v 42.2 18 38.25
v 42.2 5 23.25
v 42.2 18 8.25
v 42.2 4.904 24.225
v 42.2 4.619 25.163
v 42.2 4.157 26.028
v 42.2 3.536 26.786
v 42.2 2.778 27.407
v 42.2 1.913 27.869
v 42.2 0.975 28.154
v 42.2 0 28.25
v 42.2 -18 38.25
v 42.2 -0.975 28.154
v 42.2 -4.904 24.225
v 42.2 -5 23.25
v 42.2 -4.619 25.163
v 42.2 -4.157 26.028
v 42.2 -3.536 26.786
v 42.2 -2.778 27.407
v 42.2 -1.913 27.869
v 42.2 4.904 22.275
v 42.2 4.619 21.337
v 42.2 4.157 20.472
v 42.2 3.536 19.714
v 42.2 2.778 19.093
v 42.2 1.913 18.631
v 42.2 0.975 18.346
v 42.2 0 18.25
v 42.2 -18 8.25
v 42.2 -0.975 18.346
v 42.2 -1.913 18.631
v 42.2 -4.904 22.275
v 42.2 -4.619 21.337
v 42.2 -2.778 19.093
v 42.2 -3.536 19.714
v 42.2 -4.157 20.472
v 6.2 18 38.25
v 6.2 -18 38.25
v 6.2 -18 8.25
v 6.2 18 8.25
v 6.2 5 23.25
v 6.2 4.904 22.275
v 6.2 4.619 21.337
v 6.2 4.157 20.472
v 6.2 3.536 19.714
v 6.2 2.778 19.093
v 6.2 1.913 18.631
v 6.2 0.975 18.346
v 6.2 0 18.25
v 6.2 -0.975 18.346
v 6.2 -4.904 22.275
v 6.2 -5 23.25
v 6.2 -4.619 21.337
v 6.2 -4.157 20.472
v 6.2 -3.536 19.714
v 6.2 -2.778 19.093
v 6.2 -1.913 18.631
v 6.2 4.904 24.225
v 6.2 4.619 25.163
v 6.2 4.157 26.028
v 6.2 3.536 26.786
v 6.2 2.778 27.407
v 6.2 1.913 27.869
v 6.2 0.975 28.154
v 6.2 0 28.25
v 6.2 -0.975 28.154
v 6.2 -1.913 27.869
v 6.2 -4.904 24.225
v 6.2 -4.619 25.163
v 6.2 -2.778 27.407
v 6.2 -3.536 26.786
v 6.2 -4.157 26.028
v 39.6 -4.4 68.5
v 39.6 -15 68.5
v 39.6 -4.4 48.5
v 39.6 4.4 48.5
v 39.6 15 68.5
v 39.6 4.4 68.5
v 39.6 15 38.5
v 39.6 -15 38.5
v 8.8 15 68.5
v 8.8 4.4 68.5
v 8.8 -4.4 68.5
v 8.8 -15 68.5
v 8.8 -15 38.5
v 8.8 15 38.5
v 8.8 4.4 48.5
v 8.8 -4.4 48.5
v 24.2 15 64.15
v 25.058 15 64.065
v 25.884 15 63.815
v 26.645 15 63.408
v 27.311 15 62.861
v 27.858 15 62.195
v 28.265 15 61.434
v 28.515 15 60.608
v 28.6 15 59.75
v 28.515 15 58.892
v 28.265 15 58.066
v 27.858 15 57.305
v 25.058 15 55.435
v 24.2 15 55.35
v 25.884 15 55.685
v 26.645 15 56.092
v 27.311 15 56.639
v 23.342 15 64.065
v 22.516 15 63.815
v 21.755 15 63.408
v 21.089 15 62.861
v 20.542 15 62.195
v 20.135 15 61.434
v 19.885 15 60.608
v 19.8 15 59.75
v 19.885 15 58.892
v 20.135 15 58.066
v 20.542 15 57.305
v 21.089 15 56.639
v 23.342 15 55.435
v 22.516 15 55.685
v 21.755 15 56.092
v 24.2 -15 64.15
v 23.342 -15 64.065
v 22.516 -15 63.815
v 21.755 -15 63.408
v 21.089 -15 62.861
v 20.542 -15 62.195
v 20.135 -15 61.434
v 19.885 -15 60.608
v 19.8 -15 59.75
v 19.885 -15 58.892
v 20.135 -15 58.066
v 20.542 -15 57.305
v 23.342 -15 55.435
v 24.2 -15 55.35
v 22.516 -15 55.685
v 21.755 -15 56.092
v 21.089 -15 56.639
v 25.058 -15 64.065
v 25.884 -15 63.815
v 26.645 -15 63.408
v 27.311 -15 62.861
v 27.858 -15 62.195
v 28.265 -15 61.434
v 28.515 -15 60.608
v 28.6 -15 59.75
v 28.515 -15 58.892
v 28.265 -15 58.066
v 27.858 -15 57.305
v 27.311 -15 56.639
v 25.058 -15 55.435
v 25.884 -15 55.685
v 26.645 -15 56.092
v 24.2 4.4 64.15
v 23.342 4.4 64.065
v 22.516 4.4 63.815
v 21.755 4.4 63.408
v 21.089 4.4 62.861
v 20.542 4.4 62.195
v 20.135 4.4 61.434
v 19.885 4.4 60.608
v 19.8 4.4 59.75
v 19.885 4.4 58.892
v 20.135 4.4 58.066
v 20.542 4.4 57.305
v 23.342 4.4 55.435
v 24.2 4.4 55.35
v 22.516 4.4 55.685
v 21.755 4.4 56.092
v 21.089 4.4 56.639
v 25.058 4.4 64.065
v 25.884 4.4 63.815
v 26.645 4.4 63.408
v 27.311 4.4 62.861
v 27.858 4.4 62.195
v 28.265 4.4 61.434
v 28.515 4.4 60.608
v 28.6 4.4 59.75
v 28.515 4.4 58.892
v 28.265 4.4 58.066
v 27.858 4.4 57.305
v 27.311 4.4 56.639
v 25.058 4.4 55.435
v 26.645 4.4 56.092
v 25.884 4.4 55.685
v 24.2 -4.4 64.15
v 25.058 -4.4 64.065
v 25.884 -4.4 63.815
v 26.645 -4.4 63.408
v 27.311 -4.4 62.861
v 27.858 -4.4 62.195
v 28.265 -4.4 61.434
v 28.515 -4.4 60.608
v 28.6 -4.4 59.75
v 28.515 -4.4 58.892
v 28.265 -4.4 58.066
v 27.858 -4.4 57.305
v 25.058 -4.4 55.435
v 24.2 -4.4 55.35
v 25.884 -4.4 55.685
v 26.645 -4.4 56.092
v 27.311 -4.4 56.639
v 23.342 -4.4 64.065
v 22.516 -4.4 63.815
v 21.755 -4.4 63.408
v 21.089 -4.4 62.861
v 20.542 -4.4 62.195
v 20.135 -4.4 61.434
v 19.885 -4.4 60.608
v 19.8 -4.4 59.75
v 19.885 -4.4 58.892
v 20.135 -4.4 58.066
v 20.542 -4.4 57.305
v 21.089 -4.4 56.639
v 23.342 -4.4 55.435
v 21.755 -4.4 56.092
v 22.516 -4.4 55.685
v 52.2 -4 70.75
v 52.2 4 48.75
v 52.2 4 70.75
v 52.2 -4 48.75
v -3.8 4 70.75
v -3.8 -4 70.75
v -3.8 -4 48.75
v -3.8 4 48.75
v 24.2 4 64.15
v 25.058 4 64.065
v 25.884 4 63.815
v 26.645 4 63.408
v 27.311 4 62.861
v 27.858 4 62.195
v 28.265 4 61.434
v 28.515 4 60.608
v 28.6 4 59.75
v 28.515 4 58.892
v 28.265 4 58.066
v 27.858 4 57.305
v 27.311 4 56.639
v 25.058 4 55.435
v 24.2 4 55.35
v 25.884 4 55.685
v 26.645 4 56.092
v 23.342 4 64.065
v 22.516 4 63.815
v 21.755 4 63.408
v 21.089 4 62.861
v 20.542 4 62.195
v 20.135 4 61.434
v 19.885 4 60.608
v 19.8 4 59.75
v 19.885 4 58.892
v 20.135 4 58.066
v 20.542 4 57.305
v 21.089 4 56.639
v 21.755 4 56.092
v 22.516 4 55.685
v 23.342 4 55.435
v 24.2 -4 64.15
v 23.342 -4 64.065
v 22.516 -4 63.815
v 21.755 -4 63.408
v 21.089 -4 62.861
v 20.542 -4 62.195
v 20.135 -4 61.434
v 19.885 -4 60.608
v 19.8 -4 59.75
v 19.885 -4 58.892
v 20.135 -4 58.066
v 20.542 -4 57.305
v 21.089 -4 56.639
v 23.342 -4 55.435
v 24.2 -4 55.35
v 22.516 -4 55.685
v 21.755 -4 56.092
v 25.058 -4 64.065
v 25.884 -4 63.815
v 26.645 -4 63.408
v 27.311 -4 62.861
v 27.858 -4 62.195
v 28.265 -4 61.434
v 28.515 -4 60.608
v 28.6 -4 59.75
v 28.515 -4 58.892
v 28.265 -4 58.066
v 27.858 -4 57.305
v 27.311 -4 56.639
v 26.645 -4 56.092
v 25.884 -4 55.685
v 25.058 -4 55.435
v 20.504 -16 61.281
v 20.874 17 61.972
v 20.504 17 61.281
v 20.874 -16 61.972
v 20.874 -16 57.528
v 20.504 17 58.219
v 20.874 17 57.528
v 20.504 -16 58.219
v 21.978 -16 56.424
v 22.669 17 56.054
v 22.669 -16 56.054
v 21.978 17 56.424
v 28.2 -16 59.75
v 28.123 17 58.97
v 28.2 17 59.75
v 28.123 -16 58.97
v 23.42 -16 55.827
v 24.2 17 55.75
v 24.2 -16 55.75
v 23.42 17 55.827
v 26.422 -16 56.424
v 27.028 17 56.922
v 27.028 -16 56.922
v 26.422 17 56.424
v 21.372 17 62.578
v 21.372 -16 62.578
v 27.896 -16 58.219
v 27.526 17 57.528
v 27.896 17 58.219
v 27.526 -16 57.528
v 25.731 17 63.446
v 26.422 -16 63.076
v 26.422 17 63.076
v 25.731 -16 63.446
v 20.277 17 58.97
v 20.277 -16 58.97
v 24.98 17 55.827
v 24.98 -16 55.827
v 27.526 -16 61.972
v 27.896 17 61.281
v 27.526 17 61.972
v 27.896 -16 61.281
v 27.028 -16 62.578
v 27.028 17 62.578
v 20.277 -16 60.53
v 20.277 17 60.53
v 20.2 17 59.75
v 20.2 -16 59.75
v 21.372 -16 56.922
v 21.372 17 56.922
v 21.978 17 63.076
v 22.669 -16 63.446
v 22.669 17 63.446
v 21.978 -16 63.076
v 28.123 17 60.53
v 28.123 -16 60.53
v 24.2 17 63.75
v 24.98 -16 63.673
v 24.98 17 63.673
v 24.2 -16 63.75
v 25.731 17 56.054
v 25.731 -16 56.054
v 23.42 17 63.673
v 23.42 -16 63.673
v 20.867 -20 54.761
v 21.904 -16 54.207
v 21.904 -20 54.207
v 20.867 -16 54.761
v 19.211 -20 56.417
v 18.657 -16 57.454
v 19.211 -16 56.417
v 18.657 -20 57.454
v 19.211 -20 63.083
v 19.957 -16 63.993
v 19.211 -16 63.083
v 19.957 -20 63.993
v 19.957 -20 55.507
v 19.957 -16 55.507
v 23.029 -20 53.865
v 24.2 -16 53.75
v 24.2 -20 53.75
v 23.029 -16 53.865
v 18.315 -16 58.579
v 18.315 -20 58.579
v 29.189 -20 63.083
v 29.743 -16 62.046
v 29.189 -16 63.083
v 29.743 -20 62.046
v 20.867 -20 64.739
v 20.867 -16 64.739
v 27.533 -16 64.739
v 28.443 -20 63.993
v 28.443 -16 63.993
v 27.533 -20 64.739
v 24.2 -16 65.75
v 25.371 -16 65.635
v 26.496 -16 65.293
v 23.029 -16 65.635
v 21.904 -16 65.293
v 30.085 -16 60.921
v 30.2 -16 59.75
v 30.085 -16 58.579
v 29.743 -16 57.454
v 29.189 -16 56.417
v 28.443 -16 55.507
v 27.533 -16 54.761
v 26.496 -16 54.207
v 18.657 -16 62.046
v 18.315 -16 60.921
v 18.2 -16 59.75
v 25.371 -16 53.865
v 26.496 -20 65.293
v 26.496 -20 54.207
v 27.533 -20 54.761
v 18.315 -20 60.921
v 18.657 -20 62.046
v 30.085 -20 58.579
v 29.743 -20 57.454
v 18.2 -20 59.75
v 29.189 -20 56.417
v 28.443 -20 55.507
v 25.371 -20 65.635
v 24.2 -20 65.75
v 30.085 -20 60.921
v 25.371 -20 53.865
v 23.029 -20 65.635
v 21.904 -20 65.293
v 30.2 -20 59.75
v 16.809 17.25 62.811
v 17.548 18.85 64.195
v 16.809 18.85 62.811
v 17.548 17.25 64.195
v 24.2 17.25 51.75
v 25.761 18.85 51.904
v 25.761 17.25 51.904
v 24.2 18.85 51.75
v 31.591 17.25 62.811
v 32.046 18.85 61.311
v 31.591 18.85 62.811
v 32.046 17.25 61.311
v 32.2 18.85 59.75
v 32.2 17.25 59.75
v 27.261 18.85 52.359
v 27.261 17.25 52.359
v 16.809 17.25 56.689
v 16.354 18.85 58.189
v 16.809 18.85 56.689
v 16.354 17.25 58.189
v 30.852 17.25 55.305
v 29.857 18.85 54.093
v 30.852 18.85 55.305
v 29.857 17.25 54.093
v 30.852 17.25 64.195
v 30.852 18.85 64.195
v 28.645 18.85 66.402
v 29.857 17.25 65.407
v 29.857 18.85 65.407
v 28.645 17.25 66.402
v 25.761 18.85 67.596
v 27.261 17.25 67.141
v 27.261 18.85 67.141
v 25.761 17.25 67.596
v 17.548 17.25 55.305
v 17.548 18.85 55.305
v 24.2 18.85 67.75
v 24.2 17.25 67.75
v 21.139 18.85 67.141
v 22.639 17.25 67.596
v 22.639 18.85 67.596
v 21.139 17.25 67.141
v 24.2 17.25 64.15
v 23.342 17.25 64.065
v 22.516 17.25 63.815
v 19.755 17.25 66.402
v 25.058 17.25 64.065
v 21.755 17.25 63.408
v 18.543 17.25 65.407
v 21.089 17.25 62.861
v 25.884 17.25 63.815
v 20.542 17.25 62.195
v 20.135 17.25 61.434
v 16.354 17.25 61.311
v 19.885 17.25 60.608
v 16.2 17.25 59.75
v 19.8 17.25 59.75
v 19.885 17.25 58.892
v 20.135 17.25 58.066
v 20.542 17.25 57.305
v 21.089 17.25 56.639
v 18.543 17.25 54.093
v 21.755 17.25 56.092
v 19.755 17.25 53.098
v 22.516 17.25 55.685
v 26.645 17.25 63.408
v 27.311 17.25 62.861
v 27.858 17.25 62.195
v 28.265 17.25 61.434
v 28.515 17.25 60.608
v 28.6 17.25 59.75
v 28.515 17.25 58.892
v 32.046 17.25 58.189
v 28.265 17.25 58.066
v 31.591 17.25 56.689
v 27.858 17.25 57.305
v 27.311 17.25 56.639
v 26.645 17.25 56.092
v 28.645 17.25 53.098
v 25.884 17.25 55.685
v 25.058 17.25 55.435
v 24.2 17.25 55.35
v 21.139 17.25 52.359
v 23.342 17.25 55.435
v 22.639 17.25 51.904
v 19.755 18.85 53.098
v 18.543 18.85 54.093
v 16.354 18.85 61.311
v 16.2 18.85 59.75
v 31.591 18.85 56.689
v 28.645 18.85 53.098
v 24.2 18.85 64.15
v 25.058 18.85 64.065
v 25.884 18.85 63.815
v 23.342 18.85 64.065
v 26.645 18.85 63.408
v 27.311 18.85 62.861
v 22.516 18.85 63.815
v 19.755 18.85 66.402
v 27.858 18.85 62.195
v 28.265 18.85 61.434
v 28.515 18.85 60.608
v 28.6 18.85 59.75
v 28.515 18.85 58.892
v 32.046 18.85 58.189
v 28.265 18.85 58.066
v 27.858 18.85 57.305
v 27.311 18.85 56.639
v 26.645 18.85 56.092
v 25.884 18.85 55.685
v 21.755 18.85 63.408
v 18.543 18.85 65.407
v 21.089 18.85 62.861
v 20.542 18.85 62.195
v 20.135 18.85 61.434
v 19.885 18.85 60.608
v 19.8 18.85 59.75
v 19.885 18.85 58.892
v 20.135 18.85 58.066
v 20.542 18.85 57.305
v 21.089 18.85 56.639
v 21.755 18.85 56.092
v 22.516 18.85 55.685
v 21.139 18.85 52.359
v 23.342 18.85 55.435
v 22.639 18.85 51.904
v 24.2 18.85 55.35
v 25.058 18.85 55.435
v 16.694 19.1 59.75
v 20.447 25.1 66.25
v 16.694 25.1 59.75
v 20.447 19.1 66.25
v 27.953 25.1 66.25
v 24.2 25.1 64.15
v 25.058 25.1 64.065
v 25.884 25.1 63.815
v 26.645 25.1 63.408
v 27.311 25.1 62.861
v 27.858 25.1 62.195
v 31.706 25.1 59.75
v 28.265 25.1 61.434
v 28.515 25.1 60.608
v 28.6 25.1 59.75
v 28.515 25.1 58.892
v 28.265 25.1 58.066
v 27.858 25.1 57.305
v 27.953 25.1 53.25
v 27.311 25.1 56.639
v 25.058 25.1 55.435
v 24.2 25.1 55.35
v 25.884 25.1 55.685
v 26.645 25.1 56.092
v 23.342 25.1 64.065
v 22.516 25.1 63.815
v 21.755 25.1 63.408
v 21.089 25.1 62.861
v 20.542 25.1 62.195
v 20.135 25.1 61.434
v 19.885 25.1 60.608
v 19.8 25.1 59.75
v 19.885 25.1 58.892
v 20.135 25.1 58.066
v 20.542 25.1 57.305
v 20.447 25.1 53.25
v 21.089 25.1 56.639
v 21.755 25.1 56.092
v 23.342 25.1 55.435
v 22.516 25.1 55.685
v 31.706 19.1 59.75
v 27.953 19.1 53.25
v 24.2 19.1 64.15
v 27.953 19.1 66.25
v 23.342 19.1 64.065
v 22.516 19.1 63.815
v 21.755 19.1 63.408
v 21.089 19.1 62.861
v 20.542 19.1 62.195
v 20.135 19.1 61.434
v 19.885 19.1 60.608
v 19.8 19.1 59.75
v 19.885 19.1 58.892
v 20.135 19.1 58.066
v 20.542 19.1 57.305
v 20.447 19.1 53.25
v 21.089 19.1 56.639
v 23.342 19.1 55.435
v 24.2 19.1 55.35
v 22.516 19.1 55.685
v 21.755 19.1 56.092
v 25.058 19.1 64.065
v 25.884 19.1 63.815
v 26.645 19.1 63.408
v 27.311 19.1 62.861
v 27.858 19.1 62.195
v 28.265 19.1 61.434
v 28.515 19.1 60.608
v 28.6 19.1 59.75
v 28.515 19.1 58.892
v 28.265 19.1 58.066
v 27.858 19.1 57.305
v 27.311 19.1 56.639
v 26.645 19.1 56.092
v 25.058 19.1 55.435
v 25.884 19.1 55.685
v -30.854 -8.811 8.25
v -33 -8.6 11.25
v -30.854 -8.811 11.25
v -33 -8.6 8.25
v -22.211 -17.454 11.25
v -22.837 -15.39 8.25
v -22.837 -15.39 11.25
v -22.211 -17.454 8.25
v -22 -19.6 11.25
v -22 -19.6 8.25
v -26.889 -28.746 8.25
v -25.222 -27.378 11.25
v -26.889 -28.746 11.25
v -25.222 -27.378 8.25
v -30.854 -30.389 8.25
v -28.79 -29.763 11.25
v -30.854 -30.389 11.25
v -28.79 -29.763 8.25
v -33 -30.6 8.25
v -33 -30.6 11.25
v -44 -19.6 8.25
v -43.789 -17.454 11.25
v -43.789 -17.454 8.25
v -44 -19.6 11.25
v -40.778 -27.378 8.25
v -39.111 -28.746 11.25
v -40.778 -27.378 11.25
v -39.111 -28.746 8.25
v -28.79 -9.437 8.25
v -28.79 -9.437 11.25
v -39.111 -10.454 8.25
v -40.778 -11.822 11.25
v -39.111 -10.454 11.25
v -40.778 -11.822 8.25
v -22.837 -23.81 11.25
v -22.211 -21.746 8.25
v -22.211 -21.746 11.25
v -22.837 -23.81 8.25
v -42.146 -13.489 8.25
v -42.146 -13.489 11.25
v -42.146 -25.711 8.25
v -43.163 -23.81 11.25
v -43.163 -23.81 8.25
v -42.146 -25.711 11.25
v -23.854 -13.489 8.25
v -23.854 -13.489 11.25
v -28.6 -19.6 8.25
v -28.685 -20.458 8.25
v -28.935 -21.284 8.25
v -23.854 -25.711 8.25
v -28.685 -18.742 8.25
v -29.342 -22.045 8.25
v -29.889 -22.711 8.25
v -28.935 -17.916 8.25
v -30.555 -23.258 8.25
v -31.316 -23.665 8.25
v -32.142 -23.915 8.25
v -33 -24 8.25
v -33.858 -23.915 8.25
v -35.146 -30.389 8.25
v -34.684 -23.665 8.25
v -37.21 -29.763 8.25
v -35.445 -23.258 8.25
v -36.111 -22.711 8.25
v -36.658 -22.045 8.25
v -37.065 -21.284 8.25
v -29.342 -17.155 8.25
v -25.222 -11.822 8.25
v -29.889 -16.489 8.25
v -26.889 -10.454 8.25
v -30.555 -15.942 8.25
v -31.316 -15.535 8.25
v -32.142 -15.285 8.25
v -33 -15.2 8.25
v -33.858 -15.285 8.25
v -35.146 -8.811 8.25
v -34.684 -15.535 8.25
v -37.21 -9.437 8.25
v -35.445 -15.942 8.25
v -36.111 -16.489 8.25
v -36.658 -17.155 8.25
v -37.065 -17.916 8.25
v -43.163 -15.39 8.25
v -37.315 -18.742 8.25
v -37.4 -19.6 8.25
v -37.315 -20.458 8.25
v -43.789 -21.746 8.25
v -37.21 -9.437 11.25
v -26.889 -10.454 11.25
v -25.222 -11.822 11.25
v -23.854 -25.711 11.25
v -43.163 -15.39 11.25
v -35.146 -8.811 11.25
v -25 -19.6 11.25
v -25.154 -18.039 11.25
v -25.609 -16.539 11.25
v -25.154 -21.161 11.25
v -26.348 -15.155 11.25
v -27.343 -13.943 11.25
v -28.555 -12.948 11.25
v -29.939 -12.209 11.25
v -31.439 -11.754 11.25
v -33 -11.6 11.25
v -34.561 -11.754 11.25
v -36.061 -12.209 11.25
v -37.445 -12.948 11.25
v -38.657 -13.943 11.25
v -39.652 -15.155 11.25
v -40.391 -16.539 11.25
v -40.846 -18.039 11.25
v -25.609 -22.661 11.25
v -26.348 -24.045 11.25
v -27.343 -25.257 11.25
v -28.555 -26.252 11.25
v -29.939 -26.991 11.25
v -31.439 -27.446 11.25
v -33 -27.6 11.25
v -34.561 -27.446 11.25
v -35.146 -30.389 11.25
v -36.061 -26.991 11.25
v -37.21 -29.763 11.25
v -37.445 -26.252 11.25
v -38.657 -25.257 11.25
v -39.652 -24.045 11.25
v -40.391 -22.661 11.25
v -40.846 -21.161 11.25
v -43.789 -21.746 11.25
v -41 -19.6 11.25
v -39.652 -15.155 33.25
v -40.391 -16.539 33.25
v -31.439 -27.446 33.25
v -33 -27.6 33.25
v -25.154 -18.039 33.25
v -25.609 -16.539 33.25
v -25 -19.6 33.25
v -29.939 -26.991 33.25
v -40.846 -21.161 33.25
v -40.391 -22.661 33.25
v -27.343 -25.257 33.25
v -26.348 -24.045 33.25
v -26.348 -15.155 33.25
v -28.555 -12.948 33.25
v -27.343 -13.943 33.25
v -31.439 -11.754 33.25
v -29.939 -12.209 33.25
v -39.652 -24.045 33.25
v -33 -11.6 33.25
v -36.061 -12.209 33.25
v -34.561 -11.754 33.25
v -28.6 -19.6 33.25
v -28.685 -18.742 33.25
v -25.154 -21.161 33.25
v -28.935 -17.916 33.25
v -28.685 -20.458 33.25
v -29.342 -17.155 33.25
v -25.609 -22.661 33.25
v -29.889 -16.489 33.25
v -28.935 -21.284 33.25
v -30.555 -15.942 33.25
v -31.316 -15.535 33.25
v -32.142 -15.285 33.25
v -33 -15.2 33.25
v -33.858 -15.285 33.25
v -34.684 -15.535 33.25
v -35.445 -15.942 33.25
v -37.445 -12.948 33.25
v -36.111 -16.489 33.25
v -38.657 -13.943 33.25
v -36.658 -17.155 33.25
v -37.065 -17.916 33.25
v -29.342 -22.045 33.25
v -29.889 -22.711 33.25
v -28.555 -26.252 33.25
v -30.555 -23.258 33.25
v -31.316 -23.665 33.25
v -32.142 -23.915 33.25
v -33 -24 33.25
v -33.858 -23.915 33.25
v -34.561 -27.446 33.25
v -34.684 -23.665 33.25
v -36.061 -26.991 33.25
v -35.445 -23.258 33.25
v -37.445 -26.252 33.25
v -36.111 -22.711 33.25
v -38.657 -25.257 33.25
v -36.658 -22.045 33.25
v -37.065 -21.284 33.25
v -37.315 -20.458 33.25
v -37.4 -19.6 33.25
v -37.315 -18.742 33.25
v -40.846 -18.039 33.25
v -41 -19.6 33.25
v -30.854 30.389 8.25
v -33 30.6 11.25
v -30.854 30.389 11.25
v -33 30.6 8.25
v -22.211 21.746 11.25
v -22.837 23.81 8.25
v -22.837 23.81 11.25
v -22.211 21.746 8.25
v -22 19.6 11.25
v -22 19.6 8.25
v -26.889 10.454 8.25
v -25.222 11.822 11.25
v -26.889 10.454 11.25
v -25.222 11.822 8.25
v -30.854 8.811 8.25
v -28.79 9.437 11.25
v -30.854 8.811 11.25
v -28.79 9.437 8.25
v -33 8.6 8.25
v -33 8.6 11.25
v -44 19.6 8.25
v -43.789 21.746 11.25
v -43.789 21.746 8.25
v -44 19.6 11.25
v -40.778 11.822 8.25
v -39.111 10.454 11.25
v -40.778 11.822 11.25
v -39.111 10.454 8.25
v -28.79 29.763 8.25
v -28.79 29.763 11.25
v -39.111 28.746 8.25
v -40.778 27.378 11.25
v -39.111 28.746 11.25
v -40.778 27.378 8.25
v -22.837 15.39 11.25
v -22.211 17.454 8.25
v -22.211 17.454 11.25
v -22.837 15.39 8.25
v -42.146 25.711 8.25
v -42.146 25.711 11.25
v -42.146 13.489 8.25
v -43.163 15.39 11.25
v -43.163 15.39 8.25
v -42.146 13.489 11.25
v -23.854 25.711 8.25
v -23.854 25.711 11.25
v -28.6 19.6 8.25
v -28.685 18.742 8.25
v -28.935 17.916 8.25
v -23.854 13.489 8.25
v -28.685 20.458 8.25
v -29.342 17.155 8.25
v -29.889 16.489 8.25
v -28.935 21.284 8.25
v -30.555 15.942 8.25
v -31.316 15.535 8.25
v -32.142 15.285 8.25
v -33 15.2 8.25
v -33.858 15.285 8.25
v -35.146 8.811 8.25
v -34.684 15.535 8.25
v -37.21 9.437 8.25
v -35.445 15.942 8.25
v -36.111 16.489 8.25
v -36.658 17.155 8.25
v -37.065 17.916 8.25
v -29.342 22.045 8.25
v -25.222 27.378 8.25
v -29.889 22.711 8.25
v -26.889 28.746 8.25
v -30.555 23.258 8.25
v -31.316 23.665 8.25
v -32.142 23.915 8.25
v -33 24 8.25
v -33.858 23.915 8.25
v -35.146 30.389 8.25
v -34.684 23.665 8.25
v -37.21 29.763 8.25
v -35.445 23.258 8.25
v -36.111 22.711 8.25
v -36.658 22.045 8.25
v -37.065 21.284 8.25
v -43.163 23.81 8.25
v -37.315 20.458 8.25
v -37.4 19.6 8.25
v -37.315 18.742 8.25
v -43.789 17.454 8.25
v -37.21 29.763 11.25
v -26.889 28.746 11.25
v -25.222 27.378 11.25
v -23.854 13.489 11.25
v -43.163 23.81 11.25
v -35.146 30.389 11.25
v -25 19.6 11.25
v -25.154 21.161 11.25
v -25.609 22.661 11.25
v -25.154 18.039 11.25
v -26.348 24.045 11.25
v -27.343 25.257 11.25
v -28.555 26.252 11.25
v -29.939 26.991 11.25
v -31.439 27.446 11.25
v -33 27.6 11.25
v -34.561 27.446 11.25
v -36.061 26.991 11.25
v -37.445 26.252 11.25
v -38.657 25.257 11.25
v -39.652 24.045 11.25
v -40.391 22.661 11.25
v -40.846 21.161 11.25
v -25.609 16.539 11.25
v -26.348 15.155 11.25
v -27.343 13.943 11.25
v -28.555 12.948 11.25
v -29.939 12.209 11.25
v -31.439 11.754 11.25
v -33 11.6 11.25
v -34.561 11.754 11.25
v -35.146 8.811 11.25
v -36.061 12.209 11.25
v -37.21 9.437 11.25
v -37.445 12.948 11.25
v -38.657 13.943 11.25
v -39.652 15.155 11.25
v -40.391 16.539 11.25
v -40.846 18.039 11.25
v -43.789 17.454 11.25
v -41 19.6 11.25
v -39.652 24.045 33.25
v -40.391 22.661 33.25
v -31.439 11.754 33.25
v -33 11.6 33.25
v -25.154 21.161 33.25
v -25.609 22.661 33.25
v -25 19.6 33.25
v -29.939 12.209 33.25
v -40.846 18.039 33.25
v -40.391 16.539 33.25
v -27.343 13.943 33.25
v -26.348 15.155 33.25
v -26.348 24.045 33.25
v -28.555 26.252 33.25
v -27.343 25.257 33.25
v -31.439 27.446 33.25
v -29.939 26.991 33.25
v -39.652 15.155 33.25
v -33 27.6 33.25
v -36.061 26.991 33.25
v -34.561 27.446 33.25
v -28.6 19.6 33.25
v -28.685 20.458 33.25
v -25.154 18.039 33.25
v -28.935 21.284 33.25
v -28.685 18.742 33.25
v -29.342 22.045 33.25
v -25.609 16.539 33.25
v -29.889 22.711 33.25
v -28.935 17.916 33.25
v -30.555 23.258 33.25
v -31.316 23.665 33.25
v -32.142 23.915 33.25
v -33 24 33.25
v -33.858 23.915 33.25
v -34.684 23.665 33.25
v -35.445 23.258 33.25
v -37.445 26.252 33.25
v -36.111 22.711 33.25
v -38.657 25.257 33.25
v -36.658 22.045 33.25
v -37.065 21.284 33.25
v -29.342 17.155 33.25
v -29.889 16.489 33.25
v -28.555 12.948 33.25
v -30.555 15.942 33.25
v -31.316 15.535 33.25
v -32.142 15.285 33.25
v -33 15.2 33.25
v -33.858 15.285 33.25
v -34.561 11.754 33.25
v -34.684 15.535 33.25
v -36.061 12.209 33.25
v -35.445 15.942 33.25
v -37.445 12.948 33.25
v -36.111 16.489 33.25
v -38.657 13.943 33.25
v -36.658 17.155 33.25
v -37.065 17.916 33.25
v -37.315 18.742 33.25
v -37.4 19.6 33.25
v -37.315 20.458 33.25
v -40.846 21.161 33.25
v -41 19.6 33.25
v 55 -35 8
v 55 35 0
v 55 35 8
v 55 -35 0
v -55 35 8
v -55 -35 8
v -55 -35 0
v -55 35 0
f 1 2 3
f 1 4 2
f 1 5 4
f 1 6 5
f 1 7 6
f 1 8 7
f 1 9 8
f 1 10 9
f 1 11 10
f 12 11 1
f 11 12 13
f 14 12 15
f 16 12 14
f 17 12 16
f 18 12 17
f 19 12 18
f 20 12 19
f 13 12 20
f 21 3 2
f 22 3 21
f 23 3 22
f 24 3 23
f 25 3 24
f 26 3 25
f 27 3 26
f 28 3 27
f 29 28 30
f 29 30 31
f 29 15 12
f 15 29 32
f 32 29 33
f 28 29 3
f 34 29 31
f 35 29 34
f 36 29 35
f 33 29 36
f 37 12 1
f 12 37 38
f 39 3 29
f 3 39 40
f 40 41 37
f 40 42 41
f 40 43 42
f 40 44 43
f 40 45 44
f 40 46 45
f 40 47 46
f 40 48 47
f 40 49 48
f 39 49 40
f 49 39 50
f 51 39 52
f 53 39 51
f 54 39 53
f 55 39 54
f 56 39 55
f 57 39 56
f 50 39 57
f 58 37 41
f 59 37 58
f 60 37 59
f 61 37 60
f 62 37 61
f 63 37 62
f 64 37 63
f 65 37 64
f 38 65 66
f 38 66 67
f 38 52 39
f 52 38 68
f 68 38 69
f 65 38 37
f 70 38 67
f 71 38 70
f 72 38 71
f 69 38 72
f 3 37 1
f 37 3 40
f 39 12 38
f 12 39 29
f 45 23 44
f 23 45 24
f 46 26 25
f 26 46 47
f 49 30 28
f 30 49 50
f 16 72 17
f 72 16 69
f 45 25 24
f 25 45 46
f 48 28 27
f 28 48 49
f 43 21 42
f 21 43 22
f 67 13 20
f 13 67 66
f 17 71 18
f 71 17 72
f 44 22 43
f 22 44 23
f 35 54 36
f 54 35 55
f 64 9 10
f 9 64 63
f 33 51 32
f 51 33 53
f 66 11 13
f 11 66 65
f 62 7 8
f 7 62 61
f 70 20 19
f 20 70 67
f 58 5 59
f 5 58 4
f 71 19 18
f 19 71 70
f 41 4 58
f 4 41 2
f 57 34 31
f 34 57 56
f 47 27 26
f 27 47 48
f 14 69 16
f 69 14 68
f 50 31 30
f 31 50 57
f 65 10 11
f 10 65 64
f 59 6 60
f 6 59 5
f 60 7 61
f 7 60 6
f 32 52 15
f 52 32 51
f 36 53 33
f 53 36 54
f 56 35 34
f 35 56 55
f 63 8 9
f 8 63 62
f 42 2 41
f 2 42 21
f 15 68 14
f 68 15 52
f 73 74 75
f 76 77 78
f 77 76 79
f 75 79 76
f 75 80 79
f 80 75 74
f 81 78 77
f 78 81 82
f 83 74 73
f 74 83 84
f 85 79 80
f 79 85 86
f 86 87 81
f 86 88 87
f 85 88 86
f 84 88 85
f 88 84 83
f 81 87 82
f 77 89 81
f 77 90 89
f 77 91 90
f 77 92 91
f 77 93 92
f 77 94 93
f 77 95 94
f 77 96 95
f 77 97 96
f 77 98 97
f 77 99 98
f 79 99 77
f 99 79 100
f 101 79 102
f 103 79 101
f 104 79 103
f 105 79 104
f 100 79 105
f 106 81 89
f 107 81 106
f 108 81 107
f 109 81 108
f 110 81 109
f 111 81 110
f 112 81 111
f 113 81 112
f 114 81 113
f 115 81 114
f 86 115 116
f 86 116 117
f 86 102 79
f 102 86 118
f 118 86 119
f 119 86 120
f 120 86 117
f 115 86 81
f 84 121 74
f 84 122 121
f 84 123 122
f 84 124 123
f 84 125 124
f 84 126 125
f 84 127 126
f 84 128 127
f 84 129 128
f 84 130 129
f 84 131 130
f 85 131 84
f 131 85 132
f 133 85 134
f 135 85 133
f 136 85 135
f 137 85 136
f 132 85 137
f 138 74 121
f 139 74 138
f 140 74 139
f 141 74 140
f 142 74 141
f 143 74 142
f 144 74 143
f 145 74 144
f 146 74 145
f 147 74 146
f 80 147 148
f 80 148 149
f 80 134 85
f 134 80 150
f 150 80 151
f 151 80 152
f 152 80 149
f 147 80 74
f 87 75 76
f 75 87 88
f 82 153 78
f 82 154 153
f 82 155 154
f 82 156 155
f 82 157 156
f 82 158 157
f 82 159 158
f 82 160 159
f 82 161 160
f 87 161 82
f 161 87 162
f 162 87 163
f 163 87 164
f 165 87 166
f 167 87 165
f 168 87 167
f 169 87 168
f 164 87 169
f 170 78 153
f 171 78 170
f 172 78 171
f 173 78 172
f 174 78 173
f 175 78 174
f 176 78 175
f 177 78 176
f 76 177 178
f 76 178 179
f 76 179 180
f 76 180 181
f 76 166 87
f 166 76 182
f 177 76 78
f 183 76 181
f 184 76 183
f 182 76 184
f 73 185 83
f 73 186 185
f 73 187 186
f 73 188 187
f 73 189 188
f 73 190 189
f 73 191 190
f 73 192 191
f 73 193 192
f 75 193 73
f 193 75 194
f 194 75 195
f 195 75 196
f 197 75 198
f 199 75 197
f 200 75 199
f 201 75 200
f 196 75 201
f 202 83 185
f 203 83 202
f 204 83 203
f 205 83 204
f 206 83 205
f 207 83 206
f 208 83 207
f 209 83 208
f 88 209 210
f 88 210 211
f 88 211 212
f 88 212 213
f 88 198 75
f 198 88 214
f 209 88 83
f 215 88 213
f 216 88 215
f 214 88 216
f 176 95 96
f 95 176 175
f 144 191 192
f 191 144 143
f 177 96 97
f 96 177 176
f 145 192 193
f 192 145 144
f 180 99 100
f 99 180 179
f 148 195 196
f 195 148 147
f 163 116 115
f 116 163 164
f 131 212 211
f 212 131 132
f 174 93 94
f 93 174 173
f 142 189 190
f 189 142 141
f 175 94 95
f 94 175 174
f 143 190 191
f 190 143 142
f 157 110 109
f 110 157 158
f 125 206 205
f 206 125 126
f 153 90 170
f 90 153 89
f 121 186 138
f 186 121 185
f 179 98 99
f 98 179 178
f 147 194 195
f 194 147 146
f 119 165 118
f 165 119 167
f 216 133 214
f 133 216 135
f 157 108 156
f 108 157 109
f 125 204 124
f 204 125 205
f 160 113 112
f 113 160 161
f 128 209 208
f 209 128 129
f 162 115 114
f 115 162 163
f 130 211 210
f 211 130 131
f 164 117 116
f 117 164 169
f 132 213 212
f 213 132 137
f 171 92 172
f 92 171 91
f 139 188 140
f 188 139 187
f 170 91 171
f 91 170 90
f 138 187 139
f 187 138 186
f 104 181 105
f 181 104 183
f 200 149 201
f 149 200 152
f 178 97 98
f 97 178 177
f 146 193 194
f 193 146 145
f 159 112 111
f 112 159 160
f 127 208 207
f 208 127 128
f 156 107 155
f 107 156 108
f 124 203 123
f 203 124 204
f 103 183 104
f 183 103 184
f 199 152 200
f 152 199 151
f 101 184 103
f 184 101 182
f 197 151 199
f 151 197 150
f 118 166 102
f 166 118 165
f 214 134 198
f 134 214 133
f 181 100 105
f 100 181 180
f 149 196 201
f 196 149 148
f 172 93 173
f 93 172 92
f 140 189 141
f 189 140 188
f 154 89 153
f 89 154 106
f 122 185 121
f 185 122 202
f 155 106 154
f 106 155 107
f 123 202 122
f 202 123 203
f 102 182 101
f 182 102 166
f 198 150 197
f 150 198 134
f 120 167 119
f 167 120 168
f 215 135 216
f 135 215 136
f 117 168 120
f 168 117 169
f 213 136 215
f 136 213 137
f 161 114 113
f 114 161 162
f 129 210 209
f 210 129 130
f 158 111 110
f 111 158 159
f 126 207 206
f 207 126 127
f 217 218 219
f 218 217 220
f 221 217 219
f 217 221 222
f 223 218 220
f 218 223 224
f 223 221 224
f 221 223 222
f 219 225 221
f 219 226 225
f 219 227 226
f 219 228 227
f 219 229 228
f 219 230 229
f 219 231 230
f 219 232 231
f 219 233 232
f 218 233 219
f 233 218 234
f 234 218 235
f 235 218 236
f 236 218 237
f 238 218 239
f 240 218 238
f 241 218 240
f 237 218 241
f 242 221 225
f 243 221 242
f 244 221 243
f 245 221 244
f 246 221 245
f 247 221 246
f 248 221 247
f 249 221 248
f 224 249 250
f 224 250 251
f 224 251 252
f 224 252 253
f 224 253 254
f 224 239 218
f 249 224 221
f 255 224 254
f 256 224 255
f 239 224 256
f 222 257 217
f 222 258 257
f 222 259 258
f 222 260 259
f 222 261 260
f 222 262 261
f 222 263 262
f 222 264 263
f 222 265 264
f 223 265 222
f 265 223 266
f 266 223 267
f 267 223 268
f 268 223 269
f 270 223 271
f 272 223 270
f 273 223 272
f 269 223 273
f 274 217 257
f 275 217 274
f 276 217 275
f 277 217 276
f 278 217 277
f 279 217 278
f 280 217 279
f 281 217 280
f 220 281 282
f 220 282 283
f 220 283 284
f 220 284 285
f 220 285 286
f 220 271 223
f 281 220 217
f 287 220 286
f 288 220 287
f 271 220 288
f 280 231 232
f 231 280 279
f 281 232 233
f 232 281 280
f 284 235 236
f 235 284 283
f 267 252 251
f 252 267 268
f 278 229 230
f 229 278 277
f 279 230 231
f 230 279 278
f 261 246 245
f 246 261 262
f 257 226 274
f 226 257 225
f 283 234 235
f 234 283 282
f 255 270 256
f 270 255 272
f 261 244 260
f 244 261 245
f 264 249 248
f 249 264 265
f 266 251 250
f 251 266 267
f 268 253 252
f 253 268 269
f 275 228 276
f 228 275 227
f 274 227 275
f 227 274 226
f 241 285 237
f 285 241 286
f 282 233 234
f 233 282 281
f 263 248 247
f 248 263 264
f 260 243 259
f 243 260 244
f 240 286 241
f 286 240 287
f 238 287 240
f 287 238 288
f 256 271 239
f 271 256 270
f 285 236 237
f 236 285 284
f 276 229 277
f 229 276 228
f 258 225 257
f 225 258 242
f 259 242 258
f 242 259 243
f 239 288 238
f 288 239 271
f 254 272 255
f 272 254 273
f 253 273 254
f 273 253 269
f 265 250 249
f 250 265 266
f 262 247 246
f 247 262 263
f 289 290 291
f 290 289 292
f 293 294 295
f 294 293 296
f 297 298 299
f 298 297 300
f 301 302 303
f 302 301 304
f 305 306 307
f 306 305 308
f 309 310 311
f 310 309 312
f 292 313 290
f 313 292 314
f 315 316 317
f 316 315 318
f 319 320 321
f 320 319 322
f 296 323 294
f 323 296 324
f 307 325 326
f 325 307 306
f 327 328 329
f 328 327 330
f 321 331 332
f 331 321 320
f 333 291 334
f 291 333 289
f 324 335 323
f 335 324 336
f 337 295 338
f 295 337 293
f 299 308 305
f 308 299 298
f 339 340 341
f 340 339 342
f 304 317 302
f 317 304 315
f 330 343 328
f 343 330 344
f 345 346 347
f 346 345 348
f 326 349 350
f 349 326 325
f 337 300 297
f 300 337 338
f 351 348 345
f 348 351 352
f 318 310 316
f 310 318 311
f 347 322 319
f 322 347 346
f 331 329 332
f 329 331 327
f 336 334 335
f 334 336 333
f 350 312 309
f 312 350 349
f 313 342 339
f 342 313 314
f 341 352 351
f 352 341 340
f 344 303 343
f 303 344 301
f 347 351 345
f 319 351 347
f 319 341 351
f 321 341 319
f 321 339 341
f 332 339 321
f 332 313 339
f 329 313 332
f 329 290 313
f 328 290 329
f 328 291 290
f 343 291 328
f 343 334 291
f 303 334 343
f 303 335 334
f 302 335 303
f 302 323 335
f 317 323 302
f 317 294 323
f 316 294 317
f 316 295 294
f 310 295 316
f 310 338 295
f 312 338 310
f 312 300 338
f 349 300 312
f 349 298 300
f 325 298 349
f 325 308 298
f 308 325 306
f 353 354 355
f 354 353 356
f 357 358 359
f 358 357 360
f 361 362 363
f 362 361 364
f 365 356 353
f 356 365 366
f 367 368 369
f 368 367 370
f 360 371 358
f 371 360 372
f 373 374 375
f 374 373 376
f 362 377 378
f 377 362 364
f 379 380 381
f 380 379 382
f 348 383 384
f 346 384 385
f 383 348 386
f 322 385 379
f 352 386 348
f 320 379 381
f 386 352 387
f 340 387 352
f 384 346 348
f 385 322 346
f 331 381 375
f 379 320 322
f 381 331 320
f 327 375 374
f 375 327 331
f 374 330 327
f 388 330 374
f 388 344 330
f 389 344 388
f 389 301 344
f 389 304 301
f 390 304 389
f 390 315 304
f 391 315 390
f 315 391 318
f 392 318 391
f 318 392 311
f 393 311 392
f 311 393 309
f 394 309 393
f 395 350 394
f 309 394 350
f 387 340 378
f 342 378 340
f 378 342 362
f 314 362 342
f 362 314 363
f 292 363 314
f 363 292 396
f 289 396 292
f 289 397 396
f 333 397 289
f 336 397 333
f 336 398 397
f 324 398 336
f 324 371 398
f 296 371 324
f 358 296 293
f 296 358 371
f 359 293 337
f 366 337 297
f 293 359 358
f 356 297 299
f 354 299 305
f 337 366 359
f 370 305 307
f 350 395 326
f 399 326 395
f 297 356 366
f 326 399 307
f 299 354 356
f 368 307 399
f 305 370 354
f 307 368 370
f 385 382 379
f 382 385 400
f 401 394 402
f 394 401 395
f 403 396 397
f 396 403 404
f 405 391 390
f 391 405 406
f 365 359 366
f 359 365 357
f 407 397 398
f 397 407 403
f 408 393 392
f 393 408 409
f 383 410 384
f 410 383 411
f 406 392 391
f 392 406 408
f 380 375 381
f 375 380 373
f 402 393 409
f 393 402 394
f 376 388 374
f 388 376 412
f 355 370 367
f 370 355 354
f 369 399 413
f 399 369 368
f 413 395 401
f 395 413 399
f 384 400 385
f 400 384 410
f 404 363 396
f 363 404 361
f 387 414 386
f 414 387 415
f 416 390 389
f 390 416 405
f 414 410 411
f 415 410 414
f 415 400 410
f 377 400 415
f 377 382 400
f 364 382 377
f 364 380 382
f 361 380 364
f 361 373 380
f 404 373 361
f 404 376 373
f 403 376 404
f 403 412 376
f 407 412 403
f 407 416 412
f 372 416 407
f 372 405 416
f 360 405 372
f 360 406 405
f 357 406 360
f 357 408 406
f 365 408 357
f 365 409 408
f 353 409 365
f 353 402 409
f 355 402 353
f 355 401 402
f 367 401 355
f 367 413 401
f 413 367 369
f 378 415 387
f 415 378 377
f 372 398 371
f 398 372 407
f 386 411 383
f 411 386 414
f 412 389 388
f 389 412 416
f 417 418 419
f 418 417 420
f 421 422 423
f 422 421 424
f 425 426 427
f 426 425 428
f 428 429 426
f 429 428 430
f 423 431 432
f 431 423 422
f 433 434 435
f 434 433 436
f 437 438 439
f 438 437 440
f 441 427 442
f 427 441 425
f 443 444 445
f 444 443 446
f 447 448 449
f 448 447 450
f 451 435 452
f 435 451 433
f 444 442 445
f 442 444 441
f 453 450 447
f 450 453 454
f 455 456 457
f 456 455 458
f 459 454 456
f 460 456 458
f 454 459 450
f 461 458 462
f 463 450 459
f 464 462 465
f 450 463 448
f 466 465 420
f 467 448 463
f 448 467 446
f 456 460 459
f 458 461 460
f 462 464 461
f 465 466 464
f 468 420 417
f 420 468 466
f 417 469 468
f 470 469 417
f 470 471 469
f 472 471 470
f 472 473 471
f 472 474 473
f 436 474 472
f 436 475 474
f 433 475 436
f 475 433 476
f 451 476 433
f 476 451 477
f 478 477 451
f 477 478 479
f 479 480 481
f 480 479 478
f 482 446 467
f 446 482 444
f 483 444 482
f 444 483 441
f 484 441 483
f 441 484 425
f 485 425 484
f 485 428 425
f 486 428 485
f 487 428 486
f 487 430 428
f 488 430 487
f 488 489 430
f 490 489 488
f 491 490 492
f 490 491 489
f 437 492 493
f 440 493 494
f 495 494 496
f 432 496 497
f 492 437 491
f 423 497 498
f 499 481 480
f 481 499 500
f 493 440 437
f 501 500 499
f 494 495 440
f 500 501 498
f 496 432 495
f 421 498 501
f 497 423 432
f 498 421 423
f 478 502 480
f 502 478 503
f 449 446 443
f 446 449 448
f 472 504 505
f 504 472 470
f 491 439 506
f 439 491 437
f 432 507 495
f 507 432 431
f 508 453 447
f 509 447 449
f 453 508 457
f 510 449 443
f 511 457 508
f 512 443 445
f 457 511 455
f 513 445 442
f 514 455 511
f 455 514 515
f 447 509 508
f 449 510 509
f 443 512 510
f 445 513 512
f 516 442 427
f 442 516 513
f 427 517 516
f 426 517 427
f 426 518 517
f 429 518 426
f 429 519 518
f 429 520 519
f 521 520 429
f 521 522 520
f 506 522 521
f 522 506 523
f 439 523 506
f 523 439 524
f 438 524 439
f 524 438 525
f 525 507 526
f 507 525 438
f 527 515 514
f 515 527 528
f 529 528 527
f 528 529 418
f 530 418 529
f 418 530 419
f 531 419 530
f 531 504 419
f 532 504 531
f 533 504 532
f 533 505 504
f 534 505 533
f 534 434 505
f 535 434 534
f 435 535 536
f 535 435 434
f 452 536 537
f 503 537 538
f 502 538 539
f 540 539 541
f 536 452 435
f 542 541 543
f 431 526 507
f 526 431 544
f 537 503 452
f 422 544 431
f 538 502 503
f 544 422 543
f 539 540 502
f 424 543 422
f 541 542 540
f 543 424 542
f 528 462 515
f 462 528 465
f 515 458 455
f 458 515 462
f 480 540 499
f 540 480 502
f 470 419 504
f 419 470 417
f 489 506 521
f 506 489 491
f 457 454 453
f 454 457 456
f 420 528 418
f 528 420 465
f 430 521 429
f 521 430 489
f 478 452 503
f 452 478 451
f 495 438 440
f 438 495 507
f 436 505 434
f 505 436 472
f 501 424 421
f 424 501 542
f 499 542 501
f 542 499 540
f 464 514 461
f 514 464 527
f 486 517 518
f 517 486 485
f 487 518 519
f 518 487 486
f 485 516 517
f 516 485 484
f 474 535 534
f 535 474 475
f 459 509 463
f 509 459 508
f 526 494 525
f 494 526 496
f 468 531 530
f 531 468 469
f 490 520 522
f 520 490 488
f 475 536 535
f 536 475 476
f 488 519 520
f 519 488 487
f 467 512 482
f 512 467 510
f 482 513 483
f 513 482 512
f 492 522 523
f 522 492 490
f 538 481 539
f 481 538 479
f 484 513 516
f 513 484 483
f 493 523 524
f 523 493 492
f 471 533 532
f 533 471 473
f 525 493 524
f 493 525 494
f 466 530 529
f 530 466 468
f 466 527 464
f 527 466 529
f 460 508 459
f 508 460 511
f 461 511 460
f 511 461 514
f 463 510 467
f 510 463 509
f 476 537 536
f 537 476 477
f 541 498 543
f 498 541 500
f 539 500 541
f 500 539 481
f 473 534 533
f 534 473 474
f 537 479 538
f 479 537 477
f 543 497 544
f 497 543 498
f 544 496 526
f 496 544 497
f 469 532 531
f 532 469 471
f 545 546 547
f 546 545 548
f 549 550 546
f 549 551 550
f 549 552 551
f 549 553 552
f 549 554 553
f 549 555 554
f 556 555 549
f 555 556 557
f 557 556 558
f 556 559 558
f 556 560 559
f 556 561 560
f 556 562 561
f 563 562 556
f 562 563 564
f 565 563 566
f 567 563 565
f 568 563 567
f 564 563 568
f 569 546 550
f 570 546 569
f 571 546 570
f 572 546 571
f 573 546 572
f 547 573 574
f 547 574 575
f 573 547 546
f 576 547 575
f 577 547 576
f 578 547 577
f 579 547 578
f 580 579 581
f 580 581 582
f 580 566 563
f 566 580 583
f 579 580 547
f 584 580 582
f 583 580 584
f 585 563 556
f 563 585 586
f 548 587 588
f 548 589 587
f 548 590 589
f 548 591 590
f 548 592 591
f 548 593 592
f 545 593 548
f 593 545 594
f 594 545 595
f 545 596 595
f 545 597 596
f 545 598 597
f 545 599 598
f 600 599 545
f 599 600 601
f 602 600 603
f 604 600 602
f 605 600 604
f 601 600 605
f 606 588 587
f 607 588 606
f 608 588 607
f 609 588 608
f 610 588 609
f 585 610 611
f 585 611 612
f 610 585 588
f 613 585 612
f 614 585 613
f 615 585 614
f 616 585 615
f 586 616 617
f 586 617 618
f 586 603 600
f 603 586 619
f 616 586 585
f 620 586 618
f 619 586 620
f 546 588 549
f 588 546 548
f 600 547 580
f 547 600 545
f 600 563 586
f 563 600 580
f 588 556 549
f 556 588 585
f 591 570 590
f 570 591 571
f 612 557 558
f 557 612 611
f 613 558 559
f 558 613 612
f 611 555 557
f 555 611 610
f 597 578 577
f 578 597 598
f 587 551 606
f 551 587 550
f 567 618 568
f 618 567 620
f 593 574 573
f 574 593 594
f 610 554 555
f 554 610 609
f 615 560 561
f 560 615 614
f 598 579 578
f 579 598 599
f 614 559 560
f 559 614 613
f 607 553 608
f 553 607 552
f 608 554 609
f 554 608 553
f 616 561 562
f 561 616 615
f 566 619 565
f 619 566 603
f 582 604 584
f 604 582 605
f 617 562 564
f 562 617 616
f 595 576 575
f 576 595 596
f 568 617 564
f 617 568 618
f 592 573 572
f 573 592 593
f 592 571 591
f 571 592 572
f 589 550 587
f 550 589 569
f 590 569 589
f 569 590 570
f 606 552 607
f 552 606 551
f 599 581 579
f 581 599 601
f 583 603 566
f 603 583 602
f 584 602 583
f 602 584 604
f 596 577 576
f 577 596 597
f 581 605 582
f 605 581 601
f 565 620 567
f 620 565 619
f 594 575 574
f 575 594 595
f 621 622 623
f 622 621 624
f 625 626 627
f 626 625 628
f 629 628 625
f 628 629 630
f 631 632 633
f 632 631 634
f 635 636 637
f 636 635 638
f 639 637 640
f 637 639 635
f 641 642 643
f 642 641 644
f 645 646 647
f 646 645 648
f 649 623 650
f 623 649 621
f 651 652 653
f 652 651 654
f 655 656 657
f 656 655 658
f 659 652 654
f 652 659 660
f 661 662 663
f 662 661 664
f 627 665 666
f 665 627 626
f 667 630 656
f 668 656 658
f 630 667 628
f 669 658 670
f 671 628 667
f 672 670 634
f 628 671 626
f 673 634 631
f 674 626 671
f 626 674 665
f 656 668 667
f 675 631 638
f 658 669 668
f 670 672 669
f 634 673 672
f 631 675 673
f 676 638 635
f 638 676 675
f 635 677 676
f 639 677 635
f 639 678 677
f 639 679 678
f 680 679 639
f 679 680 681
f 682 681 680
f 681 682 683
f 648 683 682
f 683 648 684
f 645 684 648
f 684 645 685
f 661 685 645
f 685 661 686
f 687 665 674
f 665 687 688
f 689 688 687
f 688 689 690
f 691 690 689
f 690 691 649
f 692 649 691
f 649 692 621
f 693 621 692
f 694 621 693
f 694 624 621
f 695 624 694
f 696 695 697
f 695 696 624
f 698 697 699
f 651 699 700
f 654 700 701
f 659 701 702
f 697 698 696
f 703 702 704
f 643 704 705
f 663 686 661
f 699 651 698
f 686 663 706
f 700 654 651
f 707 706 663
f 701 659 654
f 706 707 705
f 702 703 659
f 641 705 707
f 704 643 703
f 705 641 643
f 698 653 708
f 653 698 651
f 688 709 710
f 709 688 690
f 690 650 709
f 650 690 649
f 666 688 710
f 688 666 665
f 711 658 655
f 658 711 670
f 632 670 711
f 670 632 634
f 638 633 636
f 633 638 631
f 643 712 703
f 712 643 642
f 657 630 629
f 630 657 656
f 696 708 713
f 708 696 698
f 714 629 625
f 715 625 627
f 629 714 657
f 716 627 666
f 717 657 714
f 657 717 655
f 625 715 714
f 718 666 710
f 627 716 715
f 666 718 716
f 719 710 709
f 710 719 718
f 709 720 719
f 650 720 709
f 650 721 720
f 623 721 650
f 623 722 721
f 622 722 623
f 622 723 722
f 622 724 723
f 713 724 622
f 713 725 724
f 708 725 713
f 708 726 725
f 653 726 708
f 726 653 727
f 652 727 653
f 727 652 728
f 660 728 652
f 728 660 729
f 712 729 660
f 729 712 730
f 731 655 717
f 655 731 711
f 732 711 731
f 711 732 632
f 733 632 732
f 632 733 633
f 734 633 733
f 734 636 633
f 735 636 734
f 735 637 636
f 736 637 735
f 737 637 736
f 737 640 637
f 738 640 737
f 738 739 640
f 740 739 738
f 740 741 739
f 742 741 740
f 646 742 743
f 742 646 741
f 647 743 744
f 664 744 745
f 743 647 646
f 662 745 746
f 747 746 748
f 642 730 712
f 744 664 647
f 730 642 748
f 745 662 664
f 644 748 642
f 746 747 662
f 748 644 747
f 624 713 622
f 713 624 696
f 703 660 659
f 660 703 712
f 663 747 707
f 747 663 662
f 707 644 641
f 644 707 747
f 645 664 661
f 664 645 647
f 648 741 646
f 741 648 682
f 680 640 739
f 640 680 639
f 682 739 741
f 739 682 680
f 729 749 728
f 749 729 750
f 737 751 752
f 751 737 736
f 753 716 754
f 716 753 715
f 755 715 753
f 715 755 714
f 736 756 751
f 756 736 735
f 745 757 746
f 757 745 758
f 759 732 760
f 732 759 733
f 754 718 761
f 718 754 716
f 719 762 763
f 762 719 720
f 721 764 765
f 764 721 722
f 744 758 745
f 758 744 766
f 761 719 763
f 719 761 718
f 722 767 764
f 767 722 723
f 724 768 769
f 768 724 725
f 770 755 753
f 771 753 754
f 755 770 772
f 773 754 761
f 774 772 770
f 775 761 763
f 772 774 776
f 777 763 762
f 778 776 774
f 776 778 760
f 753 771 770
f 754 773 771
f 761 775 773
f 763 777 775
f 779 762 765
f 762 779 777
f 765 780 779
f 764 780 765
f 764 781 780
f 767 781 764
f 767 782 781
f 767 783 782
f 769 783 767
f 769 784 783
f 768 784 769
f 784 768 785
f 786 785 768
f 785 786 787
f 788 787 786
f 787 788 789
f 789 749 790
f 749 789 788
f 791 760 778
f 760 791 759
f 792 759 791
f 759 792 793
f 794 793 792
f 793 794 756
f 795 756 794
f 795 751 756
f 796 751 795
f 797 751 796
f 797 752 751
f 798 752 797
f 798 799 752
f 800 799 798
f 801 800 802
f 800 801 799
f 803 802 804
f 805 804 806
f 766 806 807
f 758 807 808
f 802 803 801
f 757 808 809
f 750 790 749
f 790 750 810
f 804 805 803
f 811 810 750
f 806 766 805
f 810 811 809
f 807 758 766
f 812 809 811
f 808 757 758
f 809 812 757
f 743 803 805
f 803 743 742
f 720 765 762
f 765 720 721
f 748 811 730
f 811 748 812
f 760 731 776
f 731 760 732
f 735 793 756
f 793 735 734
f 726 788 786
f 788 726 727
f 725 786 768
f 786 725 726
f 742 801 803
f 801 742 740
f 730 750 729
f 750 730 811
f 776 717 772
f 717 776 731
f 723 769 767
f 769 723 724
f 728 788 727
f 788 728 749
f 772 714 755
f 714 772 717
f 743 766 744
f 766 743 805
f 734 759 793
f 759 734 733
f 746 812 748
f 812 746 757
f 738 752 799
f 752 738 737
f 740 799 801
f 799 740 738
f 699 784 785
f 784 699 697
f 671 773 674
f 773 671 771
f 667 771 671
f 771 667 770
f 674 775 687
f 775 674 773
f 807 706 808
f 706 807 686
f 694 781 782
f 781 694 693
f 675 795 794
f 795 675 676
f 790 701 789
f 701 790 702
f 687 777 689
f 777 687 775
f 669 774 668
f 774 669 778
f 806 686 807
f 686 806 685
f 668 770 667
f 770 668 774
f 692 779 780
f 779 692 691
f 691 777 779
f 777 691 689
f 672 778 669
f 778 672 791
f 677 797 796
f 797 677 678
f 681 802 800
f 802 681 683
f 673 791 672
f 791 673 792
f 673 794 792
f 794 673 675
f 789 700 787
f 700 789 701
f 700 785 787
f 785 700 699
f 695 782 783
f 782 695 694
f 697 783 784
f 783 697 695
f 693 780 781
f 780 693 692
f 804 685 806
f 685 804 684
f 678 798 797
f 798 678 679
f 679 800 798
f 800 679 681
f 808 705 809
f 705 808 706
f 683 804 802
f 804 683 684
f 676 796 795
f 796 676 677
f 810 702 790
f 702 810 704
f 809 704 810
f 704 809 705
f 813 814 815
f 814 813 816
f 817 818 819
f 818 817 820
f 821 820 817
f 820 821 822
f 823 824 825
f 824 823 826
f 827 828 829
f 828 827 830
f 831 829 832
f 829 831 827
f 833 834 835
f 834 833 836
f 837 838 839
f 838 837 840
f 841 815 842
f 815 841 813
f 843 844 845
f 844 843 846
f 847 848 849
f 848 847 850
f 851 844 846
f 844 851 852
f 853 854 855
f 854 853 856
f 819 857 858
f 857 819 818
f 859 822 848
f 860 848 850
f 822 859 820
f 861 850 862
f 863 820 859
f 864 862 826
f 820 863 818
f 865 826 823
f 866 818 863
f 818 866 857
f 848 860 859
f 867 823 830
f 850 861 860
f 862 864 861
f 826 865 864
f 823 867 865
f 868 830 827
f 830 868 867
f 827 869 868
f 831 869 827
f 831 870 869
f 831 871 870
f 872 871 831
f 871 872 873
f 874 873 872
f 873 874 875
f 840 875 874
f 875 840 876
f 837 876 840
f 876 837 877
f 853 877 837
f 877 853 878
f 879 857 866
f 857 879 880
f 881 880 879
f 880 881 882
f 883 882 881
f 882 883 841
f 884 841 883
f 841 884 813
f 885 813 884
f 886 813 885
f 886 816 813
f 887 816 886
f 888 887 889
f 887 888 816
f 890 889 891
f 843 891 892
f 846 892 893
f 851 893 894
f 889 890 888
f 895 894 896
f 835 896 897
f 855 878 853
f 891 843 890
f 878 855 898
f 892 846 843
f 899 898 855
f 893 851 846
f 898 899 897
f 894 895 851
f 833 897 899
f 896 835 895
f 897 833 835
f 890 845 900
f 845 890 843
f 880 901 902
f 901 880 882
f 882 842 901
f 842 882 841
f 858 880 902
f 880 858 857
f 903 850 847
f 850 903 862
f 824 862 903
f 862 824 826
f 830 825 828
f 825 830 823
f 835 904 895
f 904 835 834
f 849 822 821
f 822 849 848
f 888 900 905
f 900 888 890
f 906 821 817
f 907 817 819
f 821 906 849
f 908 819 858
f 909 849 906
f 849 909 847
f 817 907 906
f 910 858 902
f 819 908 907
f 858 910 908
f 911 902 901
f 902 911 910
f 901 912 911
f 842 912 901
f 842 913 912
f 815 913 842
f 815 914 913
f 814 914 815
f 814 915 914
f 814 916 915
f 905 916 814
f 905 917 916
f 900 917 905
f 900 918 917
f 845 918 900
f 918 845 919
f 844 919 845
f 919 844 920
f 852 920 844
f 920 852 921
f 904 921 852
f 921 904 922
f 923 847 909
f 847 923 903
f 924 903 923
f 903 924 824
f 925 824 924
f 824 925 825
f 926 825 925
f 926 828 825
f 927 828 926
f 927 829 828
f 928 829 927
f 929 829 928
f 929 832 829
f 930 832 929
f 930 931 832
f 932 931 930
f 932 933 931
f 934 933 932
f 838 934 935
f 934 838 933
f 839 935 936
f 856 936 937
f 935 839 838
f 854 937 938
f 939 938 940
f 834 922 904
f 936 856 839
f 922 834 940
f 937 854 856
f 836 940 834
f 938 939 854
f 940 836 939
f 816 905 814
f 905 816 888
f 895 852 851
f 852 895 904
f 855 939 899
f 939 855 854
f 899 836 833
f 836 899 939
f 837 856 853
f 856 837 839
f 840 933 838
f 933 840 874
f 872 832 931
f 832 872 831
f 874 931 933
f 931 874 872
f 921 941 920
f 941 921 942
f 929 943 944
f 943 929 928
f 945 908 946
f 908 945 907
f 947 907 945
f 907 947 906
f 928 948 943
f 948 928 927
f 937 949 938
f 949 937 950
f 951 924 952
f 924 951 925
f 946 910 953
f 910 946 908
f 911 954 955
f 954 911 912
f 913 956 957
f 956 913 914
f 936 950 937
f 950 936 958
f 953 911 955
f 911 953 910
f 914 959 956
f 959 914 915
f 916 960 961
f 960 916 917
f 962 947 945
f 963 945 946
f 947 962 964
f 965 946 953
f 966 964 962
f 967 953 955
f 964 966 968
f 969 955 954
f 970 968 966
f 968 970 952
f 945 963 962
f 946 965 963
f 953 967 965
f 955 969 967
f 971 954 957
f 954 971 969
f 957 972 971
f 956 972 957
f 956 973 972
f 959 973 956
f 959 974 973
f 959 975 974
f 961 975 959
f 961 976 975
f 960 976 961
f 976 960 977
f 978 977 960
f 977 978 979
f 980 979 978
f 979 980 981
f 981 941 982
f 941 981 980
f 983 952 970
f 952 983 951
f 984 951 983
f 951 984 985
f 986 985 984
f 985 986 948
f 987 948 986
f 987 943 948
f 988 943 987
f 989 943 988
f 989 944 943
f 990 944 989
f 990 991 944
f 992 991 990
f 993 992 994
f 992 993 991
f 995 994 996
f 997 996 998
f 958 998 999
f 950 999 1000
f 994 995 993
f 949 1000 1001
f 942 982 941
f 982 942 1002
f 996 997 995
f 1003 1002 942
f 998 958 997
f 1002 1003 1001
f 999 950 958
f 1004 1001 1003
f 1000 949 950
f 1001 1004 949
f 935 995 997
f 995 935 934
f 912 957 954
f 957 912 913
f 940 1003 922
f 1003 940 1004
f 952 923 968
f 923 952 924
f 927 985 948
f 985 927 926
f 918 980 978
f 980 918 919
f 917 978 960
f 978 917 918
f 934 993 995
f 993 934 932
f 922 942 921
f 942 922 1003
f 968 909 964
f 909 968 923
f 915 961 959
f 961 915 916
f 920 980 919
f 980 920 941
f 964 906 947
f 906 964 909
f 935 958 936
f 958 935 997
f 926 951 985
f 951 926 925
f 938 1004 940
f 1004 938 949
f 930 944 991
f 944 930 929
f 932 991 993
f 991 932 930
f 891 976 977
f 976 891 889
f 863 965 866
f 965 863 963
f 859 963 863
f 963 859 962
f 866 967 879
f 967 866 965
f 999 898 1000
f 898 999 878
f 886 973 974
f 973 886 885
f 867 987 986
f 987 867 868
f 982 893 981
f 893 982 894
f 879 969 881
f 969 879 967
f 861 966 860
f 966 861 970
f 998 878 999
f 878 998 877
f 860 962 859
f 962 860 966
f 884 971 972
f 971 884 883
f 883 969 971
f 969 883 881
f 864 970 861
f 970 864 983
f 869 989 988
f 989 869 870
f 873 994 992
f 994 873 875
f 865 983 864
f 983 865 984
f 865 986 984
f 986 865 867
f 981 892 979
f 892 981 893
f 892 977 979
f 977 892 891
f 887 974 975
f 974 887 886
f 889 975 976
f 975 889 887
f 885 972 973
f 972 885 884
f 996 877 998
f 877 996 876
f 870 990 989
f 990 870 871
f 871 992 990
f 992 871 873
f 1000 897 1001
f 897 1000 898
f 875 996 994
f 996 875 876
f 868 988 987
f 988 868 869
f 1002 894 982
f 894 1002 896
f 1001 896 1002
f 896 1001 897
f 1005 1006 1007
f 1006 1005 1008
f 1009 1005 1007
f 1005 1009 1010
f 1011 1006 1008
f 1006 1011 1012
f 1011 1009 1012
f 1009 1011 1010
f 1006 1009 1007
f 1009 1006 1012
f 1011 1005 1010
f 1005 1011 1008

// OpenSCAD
$fn = 32;

// ------------------------------------------------------------------------
// Indexing jig: plate 110 x 70 mm, pin d8
// Every part is its own module, assembly() places every instance.
// ------------------------------------------------------------------------

// --- part 1 ---
module jig_plate() {
  difference() {
    translate([-55, -35, 0]) cube([110, 70, 8]);
  }
}

// --- part 2 ---
module locator_block() {
  difference() {
    translate([-18, -18, 0]) cube([36, 36, 30]);
    translate([0, 0, 15]) rotate([0, 90, 0]) cylinder(h = 38, d = 10, center = true);
  }
}

// --- part 3 ---
module index_fork() {
  difference() {
    translate([-15.4, -15, 0]) cube([30.8, 30, 30]);
    translate([-16.4, -4.4, 10]) cube([32.8, 8.8, 21]);
    translate([0, 0, 21.25]) rotate([90, 0, 0]) cylinder(h = 32, d = 8.8, center = true);
  }
}

// --- part 4 ---
module index_arm() {
  difference() {
    translate([-28, -4, 0]) cube([56, 8, 22]);
    translate([0, 0, 11]) rotate([90, 0, 0]) cylinder(h = 10, d = 8.8, center = true);
  }
}

// --- part 5 ---
module index_pin() {
  rotate([0, 90, 0]) cylinder(h = 34, d = 8, center = true);
  translate([-20, 0, 0]) rotate([0, 90, 0]) cylinder(h = 4, d = 12);
}

// --- part 6 ---
module pin_washer() {
  difference() {
      translate([0, 0, 0]) cylinder(h = 1.6, d = 16);
      translate([0, 0, -1]) cylinder(h = 3.6, d = 8.8);
    }
}

// --- part 7 ---
module lock_nut() {
  difference() {
    linear_extrude(height = 6) polygon(points = [[7.506, 0], [3.753, 6.5], [-3.753, 6.5], [-7.506, 0], [-3.753, -6.5], [3.753, -6.5]]);
    translate([0, 0, -1]) cylinder(h = 8, d = 8.8);
  }
}

// --- part 8 ---
module guide_bush_a() {
  difference() {
    union() {
      cylinder(h = 3, d = 22);
      translate([0, 0, 3]) cylinder(h = 22, d = 16);
    }
    translate([0, 0, -1]) cylinder(h = 27, d = 8.8);
  }
}

// --- part 9 ---
module guide_bush_b() {
  difference() {
    union() {
      cylinder(h = 3, d = 22);
      translate([0, 0, 3]) cylinder(h = 22, d = 16);
    }
    translate([0, 0, -1]) cylinder(h = 27, d = 8.8);
  }
}

// --- assembly ---
module assembly() {
  color([0.80, 0.24, 0.20]) translate([0, 0, 0]) rotate([0, 0, 0]) jig_plate();
  color([0.20, 0.45, 0.75]) translate([24.2, 0, 8.25]) rotate([0, 0, 0]) locator_block();
  color([0.25, 0.62, 0.32]) translate([24.2, 0, 38.5]) rotate([0, 0, 0]) index_fork();
  color([0.92, 0.70, 0.18]) translate([24.2, 0, 48.75]) rotate([0, 0, 0]) index_arm();
  color([0.58, 0.35, 0.70]) translate([24.2, 0, 59.75]) rotate([0, 0, 90]) index_pin();
  color([0.16, 0.66, 0.66]) translate([24.2, 18.85, 59.75]) rotate([90, 0, 0]) pin_washer();
  color([0.85, 0.48, 0.18]) translate([24.2, 25.1, 59.75]) rotate([90, 0, 0]) lock_nut();
  color([0.55, 0.60, 0.65]) translate([-33, -19.6, 8.25]) rotate([0, 0, 0]) guide_bush_a();
  color([0.75, 0.30, 0.55]) translate([-33, 19.6, 8.25]) rotate([0, 0, 0]) guide_bush_b();
}

assembly();
